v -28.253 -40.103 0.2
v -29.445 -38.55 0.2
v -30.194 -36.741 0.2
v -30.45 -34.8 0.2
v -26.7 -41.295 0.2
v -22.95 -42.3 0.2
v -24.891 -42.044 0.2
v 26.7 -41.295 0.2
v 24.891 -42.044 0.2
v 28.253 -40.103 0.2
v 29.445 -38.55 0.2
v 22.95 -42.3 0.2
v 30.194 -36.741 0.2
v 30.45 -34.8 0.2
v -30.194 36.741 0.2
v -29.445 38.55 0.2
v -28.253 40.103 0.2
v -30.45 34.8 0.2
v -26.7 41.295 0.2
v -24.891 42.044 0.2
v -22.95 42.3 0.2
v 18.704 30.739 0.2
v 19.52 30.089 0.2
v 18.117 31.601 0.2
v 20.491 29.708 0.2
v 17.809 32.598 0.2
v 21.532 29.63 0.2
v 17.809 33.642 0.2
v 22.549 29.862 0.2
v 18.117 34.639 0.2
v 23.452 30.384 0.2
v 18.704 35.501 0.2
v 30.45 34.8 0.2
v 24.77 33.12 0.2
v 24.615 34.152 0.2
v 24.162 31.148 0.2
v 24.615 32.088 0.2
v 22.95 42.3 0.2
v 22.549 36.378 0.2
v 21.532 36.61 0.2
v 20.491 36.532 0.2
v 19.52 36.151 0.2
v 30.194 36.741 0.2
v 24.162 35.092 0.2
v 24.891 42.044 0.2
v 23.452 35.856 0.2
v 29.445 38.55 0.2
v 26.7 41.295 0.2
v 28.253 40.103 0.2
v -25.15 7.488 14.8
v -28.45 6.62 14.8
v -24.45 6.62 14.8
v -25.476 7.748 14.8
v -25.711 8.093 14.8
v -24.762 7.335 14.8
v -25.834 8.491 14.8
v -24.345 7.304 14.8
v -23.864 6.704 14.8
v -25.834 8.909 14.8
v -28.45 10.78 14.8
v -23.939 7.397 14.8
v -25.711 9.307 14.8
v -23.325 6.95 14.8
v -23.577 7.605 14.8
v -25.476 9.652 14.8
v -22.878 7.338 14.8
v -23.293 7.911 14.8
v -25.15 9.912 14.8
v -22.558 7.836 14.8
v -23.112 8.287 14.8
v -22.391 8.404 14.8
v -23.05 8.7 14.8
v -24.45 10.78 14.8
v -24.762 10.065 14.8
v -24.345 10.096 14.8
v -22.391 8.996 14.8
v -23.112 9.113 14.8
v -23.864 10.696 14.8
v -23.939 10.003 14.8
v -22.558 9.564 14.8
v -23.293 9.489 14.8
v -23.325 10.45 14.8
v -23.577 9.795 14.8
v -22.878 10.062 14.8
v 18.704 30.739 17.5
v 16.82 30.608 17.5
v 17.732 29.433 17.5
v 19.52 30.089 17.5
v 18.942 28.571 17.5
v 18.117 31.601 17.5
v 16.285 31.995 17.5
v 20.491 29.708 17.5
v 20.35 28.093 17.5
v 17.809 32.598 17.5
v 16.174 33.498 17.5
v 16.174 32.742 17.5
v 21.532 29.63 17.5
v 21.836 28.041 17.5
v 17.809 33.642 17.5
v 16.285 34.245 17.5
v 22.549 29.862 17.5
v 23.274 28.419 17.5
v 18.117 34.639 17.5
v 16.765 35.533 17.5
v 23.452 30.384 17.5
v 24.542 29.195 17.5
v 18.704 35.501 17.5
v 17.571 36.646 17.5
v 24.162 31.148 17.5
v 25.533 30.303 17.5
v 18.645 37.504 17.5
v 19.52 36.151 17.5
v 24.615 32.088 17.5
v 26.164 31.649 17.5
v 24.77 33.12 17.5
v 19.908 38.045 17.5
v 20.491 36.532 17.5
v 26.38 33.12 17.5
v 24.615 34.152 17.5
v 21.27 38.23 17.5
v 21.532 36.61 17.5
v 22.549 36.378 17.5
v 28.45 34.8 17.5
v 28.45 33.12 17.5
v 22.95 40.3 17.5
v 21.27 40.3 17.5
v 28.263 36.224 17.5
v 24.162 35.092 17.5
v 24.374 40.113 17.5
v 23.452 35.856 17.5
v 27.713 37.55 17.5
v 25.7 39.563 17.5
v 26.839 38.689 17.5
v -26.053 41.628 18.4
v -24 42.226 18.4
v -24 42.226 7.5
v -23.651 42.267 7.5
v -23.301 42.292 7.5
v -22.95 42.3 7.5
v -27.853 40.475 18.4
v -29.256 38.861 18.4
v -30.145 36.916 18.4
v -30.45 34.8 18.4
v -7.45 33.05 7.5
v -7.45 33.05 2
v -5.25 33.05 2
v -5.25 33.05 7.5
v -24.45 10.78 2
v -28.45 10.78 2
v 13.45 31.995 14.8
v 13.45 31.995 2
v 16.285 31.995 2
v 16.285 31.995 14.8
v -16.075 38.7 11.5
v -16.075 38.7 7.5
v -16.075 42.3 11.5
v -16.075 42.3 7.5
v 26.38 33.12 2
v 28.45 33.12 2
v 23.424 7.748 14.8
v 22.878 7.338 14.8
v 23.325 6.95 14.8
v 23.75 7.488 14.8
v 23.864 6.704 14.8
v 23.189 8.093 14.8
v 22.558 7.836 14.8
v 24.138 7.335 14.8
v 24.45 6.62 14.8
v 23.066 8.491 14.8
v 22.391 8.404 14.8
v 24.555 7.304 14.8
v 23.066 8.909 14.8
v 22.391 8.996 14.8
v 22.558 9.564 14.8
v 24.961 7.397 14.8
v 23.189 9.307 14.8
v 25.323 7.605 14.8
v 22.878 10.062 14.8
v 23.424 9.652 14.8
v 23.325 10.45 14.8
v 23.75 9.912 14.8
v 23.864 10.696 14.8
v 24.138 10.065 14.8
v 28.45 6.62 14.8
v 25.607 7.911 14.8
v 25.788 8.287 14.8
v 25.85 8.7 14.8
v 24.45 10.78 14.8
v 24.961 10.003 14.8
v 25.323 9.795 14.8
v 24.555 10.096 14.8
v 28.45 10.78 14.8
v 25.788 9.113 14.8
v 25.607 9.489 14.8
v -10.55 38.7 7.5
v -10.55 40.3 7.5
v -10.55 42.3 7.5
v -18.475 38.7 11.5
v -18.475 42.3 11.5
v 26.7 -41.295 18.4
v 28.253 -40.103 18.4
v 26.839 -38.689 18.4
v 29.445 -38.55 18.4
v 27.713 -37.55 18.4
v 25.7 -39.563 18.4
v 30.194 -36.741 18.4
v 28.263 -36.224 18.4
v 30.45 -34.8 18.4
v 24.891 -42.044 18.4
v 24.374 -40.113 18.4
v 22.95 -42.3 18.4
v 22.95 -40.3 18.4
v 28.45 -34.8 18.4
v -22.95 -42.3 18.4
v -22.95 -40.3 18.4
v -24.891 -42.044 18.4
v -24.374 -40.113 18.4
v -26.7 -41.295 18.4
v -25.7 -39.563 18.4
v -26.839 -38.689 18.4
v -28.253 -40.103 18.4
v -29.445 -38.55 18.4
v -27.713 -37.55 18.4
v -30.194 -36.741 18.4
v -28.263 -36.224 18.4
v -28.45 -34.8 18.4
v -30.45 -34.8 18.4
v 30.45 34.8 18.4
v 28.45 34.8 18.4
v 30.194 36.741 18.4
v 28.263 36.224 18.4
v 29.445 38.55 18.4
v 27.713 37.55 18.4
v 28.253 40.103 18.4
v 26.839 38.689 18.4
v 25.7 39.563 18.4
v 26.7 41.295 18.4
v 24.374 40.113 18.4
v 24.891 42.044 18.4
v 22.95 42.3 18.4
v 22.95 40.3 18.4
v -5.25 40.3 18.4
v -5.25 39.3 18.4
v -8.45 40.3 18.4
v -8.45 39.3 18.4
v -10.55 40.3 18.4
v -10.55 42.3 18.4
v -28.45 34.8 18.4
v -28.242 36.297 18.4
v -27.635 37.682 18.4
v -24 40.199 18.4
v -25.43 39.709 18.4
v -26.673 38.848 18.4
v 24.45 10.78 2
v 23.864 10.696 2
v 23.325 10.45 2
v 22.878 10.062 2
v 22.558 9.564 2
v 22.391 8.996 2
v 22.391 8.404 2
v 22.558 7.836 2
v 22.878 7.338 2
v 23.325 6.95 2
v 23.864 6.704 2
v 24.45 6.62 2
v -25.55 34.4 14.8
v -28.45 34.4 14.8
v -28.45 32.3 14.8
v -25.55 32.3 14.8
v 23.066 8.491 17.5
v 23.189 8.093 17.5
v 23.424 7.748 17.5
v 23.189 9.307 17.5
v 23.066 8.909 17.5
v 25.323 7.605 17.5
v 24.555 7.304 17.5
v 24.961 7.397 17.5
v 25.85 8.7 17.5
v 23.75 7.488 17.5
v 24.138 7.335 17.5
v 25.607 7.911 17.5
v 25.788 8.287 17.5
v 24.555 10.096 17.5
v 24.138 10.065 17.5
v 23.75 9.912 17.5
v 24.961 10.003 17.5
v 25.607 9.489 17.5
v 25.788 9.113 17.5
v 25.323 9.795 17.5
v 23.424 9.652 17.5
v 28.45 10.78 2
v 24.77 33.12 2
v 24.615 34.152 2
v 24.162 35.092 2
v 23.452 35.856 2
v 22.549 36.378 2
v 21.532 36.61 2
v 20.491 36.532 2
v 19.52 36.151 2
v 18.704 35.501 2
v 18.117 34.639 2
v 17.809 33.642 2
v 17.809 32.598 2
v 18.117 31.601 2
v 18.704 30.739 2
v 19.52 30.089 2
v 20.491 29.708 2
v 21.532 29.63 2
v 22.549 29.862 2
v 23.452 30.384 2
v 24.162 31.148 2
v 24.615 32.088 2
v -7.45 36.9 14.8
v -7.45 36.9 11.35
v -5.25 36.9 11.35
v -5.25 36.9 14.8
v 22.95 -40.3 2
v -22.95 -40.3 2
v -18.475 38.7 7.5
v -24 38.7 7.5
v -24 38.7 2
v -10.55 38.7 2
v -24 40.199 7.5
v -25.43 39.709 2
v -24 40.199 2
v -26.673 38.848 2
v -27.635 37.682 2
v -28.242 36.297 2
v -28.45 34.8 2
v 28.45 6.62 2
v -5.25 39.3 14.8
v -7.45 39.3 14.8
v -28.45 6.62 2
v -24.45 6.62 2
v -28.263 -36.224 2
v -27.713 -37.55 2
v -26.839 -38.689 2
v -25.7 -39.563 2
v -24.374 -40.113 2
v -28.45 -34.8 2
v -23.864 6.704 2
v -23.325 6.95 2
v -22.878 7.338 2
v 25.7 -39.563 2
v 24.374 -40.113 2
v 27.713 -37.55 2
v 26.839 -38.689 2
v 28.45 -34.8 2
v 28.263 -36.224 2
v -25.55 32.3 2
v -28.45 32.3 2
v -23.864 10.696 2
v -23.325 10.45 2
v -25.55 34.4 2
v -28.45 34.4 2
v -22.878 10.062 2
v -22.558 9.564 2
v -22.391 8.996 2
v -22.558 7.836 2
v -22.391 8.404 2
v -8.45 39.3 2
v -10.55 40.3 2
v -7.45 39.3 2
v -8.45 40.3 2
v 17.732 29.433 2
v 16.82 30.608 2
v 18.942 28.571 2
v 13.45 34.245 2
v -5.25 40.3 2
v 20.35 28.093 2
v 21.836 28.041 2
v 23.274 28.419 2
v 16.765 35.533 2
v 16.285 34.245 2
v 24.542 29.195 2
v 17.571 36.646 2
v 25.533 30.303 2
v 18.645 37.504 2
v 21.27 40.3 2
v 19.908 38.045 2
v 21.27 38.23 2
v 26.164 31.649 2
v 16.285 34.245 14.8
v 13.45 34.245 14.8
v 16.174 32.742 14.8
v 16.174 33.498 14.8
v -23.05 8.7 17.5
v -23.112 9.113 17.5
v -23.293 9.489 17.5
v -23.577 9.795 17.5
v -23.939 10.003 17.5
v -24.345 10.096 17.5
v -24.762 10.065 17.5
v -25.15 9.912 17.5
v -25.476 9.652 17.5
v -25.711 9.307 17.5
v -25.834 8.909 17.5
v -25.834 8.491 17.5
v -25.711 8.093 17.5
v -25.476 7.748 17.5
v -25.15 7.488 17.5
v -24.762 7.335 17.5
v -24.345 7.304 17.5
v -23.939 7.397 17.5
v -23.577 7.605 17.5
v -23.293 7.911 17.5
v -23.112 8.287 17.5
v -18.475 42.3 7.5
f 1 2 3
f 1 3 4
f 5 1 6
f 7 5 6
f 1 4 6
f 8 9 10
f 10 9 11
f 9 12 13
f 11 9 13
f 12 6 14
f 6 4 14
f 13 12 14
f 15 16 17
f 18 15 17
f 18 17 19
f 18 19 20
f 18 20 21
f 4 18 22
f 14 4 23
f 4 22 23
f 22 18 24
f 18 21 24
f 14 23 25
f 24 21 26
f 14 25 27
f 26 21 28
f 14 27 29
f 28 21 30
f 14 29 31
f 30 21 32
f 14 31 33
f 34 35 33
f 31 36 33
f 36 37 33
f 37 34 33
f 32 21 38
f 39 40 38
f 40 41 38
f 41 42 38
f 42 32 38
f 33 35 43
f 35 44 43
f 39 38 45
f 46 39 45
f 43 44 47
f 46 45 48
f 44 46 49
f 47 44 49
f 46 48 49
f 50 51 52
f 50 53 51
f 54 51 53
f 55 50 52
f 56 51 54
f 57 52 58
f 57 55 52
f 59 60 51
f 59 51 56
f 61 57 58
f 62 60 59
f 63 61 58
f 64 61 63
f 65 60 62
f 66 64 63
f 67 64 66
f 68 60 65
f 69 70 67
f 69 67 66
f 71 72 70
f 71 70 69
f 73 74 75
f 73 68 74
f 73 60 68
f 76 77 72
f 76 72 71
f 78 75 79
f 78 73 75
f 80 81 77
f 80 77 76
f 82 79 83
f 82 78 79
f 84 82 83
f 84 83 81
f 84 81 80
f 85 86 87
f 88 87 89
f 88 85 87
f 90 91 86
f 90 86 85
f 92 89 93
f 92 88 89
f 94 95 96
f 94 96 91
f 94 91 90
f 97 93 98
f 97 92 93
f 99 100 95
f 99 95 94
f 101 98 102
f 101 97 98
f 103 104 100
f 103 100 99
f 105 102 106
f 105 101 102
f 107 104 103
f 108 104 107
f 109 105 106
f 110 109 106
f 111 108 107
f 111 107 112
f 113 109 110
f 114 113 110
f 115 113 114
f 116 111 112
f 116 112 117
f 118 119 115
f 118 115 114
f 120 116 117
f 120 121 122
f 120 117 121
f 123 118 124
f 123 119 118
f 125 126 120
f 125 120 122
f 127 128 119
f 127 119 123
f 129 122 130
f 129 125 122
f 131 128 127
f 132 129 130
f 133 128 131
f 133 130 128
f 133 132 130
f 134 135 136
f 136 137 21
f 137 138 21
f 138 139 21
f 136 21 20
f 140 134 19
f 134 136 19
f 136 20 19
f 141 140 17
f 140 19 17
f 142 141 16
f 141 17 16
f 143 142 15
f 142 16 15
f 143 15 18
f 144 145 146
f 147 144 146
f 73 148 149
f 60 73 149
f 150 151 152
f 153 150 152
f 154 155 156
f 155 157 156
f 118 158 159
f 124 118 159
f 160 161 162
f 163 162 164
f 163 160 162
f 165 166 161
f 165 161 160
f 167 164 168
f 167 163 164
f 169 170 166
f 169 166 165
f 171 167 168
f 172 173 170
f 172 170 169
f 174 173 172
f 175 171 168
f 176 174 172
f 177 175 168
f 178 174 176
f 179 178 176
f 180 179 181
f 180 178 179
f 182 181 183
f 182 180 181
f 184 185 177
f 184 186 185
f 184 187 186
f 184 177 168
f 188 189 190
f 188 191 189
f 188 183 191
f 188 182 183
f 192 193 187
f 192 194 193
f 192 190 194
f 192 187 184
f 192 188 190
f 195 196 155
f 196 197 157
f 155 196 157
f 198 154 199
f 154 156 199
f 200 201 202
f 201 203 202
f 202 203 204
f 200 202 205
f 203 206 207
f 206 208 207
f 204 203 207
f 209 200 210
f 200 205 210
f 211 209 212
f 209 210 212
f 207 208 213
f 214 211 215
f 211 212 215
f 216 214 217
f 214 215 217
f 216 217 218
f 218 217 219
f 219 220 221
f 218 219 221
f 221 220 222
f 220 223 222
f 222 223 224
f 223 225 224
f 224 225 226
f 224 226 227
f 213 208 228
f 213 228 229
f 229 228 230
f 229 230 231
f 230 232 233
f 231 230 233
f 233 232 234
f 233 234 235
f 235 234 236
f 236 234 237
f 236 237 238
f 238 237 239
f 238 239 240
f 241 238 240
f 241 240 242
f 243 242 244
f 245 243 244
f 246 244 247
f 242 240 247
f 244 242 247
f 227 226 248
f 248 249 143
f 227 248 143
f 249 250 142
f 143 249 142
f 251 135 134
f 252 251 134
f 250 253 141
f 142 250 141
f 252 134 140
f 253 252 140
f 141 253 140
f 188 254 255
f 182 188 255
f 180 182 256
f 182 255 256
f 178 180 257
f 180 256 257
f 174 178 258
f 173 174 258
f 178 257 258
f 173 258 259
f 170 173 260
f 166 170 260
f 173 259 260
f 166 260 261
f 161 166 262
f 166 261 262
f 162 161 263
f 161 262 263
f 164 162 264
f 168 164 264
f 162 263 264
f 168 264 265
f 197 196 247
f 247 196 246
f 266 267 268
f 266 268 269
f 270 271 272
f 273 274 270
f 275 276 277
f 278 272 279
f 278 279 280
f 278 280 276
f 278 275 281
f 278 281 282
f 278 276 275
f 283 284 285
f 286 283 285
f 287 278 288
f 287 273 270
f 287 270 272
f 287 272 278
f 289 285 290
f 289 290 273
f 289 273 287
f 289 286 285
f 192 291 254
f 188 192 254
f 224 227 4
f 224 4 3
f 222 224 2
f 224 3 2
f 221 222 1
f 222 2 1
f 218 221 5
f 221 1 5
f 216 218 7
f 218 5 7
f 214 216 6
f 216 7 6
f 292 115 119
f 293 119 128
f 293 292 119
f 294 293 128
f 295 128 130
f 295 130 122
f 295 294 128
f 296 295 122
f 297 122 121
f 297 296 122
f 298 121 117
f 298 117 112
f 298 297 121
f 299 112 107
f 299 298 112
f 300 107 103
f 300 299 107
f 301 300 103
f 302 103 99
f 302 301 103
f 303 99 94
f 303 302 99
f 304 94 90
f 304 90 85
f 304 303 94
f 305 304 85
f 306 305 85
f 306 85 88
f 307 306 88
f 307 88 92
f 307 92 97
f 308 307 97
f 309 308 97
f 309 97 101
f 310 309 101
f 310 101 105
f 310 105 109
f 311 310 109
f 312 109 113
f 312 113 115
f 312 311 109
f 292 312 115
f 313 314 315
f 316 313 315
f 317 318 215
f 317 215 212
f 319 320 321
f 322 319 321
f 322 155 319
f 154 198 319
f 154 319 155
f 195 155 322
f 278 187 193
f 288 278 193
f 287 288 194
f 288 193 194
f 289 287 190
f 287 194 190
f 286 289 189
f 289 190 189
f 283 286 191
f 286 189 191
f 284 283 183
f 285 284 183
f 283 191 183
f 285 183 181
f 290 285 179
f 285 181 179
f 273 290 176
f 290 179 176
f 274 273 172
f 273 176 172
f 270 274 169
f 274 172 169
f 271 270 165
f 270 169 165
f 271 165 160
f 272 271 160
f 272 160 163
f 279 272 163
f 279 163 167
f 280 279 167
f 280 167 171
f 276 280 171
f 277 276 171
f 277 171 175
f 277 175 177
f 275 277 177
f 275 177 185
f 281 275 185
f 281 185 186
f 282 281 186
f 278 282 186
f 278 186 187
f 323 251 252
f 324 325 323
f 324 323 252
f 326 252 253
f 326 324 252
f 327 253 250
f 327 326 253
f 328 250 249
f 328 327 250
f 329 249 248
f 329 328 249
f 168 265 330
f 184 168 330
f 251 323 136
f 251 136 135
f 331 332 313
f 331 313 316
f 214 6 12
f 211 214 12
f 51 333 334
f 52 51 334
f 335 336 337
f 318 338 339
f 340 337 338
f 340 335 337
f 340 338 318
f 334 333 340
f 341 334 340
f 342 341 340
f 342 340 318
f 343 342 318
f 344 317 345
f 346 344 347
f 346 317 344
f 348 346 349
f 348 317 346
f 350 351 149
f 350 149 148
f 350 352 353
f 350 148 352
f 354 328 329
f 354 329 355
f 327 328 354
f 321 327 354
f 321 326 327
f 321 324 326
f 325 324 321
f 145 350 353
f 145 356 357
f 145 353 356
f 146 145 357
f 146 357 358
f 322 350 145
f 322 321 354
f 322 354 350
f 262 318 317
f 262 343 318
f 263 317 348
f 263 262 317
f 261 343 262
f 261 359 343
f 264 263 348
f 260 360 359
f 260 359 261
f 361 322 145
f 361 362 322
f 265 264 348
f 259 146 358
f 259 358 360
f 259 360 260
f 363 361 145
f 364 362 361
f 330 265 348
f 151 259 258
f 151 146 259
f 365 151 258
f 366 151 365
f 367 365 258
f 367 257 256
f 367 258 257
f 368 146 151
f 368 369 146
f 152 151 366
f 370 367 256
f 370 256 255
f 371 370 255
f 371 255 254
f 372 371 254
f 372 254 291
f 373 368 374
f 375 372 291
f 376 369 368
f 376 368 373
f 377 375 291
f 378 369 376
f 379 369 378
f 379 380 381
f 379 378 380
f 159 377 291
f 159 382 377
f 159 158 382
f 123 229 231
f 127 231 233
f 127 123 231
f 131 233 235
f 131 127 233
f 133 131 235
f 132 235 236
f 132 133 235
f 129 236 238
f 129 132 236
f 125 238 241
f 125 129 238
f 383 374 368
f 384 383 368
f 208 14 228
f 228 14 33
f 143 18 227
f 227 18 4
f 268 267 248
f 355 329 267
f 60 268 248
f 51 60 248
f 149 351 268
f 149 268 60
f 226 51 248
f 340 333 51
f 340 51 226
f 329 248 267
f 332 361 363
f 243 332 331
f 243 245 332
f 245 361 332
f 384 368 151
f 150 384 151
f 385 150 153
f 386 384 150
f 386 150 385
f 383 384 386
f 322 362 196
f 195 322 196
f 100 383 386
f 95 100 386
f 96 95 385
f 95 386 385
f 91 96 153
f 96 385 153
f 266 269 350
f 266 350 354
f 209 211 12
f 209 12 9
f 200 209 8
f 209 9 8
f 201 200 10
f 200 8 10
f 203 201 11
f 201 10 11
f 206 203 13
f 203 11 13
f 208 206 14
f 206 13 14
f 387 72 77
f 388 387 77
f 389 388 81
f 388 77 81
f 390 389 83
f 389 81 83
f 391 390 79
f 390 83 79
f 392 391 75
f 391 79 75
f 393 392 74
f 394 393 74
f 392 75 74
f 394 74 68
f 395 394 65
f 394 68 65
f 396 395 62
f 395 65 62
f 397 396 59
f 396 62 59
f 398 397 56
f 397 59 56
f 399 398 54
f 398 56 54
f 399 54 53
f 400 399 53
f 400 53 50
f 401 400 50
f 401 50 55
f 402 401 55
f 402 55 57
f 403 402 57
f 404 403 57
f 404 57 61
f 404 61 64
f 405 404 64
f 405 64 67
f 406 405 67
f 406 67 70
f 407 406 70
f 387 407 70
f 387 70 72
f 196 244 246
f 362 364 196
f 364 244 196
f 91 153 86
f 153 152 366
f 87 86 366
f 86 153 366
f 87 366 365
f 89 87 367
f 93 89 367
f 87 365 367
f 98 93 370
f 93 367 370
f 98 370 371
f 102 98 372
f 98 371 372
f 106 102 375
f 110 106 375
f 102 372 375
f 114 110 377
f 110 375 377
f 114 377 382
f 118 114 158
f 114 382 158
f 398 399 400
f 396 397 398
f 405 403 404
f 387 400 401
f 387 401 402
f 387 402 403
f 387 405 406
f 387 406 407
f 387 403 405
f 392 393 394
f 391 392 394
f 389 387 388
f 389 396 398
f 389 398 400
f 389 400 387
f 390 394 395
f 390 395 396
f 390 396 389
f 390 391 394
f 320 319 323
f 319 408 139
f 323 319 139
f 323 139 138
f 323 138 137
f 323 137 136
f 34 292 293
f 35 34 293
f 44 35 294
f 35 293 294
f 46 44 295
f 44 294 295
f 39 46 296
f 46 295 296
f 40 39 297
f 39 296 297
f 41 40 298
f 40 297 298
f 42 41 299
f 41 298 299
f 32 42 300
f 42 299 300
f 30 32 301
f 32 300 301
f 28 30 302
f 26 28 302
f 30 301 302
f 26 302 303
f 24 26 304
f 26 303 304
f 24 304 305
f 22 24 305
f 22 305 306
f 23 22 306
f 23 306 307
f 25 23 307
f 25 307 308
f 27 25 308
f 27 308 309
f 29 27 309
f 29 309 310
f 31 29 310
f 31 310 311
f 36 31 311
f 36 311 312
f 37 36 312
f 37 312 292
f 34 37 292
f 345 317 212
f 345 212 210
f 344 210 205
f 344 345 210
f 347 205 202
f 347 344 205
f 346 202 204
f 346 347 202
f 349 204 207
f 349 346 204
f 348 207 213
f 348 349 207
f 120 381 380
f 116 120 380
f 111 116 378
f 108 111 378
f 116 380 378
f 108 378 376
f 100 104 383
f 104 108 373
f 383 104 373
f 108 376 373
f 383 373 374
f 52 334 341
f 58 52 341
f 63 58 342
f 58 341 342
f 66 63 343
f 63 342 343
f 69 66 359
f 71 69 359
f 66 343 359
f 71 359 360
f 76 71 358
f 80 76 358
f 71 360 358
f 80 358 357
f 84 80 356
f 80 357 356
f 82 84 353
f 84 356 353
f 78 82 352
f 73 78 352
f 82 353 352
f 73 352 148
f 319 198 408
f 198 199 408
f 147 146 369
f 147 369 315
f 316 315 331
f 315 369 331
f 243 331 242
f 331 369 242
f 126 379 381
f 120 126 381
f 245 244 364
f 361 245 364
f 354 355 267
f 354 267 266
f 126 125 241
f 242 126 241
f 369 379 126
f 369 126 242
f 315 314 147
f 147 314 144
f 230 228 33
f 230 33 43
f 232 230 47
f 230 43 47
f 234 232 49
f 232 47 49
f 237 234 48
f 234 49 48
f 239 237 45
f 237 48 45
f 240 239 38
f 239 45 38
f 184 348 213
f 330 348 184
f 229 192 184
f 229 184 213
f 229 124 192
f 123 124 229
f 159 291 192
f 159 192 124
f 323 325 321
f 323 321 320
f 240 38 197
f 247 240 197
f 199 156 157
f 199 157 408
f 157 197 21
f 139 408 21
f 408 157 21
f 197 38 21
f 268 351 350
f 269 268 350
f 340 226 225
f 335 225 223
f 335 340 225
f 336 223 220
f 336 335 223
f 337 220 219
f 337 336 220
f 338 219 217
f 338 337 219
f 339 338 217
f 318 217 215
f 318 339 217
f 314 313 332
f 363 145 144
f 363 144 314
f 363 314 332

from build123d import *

# Parameters (mm, degrees)
F1_DEPTH    = 18.4
F2_T        = -2
F3_DEPTH    = 0.2
F4_R        = 1.4
F4_W        = 2.9
F4_H        = 2.1
F4_W_2      = 2.2
F4_H_2      = 3.4
F5_DEPTH    = 12.8
F4_R_2      = 3.5
F6_DEPTH    = 15.5
F4_H_3      = 3.85
F7_DEPTH    = 9.5
F8_T4_DEPTH = 22.7734639037
F9_DEPTH    = 1.801
F11_DEPTH   = 1
F10_W       = 1.05
F10_H       = 5.5
F12_DEPTH   = 1.6
F10_H_2     = 10.9
F13_DEPTH   = 3


# Not quite as in the source:
# - a fillet or chamfer that OpenCascade refuses, or shapes differently, is made with other operations: its cross-section is extruded or revolved along the edge and cut away or added


with BuildPart() as f1:
    # F0 (on Top) → F1 (new body)
    with BuildSketch(Plane.XY):
        with BuildLine():
            Line((-22.95, -42.3), (22.95, -42.3))
            ThreePointArc((22.95, -42.3), (28.2533008589, -40.1033008589), (30.45, -34.8))
            Line((30.45, -34.8), (30.45, 34.8))
            ThreePointArc((30.45, 34.8), (28.2533008589, 40.1033008589), (22.95, 42.3))
            Line((22.95, 42.3), (-22.95, 42.3))
            ThreePointArc((-22.95, 42.3), (-28.2533008589, 40.1033008589), (-30.45, 34.8))
            Line((-30.45, 34.8), (-30.45, -34.8))
            ThreePointArc((-30.45, -34.8), (-28.2533008589, -40.1033008589), (-22.95, -42.3))
        make_face()
    extrude(amount=F1_DEPTH)

    # F2
    f2_openings = [f1.faces().sort_by_distance(p)[0] for p in [
        (0, 0, 18.4),
    ]]
    offset(amount=F2_T, openings=f2_openings)

    # F3 (cut): a face of the model
    f3_faces = [f1.faces().sort_by_distance(p)[0] for p in [
        (0, 0, 0),
    ]]
    extrude(f3_faces, amount=-F3_DEPTH, mode=Mode.SUBTRACT)

    # F4 (on face) → F5 (join)
    with BuildSketch(Plane.XY.offset(2)):
        with BuildLine():
            Line((24.45, 6.62), (28.45, 6.62))
            Line((28.45, 6.62), (28.45, 10.78))
            Line((28.45, 10.78), (24.45, 10.78))
            ThreePointArc((24.45, 10.78), (22.37, 8.7), (24.45, 6.62))
        make_face()
        with Locations((24.45, 8.7)):
            Circle(F4_R, mode=Mode.SUBTRACT)
        with BuildLine():
            ThreePointArc((-24.45, 6.62), (-22.37, 8.7), (-24.45, 10.78))
            Line((-24.45, 10.78), (-28.45, 10.78))
            Line((-28.45, 10.78), (-28.45, 6.62))
            Line((-28.45, 6.62), (-24.45, 6.62))
        make_face()
        with Locations((-24.45, 8.7)):
            Circle(F4_R, mode=Mode.SUBTRACT)
        with Locations((-27, 33.35)):
            Rectangle(F4_W, F4_H)
        with Locations((-6.35, 38.6)):
            Rectangle(F4_W_2, F4_H_2)
        with BuildLine():
            ThreePointArc((16.2853761426, 31.995), (16.16, 33.12), (16.2853761426, 34.245))
            Line((16.2853761426, 34.245), (13.45, 34.245))
            Line((13.45, 34.245), (13.45, 31.995))
            Line((13.45, 31.995), (16.2853761426, 31.995))
        make_face()
    extrude(amount=F5_DEPTH)

    # F4 (on face) → F6 (join)
    with BuildSketch(Plane.XY.offset(2)):
        with BuildLine():
            Line((22.95, 40.3), (21.27, 40.3))
            Line((21.27, 40.3), (21.27, 38.23))
            ThreePointArc((21.27, 38.23), (18.0791262952, 37.1112936499), (16.2853761426, 34.245))
            ThreePointArc((16.2853761426, 34.245), (16.16, 33.12), (16.2853761426, 31.995))
            ThreePointArc((16.2853761426, 31.995), (21.835982371, 28.0414407598), (26.38, 33.12))
            Line((26.38, 33.12), (28.45, 33.12))
            Line((28.45, 33.12), (28.45, 34.8))
            ThreePointArc((28.45, 34.8), (26.8390872965, 38.6890872965), (22.95, 40.3))
        make_face()
        with Locations((21.27, 33.12)):
            Circle(F4_R_2, mode=Mode.SUBTRACT)
        with Locations((24.45, 8.7)):
            Circle(F4_R)
        with Locations((-24.45, 8.7)):
            Circle(F4_R)
    extrude(amount=F6_DEPTH)

    # F4 (on face) → F7 (join)
    with BuildSketch(Plane.XY.offset(2)):
        with Locations((-6.35, 34.975)):
            Rectangle(F4_W_2, F4_H_3)
    extrude(amount=F7_DEPTH)

    # F8: chamfer of 4 on 1 edges, made by hand


with BuildPart() as f8_tool2:
    # F8_s3 → F8_t4 (new body)
    with BuildSketch(Plane.YZ.offset(-17.7367319519)):
        Polygon((37.05, 11.5), (33.05, 7.5), (33.05, 11.5), align=None)
    extrude(amount=F8_T4_DEPTH)

    split(bisect_by=Plane.XZ.offset(-36.9), keep=Keep.TOP)


with BuildPart() as f1_1:
    add(f1.part)

    # F8_t1: cut F8_tool2
    add(f8_tool2.part, mode=Mode.SUBTRACT)

    # F4 (on face) → F9 (cut, through all)
    with BuildSketch(Plane.XY.offset(2)):
        with Locations((21.27, 33.12)):
            Circle(F4_R_2)
    extrude(amount=-F9_DEPTH, mode=Mode.SUBTRACT)

    # F10 (on face) → F11 (join)
    with BuildSketch(Plane.XZ.offset(-40.3)):
        Polygon((-8.45, 2), (-7.45, 2), (-7.45, 14.8), (-5.25, 14.8), (-5.25, 18.4), (-8.45, 18.4), align=None)
    extrude(amount=F11_DEPTH)

    # F10 (on face) → F12 (join)
    with BuildSketch(Plane.XZ.offset(-40.3)):
        Polygon((-22.95, 2), (-10.55, 2), (-10.55, 7.5), (-16.075, 7.5), (-16.075, 11.5), (-18.475, 11.5), (-18.475, 7.5), (-22.95, 7.5), align=None)
        with Locations((-23.475, 4.75)):
            Rectangle(F10_W, F10_H)
    extrude(amount=F12_DEPTH)

    # F10 (on face) → F13 (cut, symmetric)
    with BuildSketch(Plane.XZ.offset(-40.3)):
        Polygon((-10.55, 7.5), (-10.55, 18.4), (-22.95, 18.4), (-22.95, 7.5), (-18.475, 7.5), (-18.475, 11.5), (-16.075, 11.5), (-16.075, 7.5), align=None)
        with Locations((-23.475, 12.95)):
            Rectangle(F10_W, F10_H_2)
    extrude(amount=F13_DEPTH, both=True, mode=Mode.SUBTRACT)


solid = f1_1.part
